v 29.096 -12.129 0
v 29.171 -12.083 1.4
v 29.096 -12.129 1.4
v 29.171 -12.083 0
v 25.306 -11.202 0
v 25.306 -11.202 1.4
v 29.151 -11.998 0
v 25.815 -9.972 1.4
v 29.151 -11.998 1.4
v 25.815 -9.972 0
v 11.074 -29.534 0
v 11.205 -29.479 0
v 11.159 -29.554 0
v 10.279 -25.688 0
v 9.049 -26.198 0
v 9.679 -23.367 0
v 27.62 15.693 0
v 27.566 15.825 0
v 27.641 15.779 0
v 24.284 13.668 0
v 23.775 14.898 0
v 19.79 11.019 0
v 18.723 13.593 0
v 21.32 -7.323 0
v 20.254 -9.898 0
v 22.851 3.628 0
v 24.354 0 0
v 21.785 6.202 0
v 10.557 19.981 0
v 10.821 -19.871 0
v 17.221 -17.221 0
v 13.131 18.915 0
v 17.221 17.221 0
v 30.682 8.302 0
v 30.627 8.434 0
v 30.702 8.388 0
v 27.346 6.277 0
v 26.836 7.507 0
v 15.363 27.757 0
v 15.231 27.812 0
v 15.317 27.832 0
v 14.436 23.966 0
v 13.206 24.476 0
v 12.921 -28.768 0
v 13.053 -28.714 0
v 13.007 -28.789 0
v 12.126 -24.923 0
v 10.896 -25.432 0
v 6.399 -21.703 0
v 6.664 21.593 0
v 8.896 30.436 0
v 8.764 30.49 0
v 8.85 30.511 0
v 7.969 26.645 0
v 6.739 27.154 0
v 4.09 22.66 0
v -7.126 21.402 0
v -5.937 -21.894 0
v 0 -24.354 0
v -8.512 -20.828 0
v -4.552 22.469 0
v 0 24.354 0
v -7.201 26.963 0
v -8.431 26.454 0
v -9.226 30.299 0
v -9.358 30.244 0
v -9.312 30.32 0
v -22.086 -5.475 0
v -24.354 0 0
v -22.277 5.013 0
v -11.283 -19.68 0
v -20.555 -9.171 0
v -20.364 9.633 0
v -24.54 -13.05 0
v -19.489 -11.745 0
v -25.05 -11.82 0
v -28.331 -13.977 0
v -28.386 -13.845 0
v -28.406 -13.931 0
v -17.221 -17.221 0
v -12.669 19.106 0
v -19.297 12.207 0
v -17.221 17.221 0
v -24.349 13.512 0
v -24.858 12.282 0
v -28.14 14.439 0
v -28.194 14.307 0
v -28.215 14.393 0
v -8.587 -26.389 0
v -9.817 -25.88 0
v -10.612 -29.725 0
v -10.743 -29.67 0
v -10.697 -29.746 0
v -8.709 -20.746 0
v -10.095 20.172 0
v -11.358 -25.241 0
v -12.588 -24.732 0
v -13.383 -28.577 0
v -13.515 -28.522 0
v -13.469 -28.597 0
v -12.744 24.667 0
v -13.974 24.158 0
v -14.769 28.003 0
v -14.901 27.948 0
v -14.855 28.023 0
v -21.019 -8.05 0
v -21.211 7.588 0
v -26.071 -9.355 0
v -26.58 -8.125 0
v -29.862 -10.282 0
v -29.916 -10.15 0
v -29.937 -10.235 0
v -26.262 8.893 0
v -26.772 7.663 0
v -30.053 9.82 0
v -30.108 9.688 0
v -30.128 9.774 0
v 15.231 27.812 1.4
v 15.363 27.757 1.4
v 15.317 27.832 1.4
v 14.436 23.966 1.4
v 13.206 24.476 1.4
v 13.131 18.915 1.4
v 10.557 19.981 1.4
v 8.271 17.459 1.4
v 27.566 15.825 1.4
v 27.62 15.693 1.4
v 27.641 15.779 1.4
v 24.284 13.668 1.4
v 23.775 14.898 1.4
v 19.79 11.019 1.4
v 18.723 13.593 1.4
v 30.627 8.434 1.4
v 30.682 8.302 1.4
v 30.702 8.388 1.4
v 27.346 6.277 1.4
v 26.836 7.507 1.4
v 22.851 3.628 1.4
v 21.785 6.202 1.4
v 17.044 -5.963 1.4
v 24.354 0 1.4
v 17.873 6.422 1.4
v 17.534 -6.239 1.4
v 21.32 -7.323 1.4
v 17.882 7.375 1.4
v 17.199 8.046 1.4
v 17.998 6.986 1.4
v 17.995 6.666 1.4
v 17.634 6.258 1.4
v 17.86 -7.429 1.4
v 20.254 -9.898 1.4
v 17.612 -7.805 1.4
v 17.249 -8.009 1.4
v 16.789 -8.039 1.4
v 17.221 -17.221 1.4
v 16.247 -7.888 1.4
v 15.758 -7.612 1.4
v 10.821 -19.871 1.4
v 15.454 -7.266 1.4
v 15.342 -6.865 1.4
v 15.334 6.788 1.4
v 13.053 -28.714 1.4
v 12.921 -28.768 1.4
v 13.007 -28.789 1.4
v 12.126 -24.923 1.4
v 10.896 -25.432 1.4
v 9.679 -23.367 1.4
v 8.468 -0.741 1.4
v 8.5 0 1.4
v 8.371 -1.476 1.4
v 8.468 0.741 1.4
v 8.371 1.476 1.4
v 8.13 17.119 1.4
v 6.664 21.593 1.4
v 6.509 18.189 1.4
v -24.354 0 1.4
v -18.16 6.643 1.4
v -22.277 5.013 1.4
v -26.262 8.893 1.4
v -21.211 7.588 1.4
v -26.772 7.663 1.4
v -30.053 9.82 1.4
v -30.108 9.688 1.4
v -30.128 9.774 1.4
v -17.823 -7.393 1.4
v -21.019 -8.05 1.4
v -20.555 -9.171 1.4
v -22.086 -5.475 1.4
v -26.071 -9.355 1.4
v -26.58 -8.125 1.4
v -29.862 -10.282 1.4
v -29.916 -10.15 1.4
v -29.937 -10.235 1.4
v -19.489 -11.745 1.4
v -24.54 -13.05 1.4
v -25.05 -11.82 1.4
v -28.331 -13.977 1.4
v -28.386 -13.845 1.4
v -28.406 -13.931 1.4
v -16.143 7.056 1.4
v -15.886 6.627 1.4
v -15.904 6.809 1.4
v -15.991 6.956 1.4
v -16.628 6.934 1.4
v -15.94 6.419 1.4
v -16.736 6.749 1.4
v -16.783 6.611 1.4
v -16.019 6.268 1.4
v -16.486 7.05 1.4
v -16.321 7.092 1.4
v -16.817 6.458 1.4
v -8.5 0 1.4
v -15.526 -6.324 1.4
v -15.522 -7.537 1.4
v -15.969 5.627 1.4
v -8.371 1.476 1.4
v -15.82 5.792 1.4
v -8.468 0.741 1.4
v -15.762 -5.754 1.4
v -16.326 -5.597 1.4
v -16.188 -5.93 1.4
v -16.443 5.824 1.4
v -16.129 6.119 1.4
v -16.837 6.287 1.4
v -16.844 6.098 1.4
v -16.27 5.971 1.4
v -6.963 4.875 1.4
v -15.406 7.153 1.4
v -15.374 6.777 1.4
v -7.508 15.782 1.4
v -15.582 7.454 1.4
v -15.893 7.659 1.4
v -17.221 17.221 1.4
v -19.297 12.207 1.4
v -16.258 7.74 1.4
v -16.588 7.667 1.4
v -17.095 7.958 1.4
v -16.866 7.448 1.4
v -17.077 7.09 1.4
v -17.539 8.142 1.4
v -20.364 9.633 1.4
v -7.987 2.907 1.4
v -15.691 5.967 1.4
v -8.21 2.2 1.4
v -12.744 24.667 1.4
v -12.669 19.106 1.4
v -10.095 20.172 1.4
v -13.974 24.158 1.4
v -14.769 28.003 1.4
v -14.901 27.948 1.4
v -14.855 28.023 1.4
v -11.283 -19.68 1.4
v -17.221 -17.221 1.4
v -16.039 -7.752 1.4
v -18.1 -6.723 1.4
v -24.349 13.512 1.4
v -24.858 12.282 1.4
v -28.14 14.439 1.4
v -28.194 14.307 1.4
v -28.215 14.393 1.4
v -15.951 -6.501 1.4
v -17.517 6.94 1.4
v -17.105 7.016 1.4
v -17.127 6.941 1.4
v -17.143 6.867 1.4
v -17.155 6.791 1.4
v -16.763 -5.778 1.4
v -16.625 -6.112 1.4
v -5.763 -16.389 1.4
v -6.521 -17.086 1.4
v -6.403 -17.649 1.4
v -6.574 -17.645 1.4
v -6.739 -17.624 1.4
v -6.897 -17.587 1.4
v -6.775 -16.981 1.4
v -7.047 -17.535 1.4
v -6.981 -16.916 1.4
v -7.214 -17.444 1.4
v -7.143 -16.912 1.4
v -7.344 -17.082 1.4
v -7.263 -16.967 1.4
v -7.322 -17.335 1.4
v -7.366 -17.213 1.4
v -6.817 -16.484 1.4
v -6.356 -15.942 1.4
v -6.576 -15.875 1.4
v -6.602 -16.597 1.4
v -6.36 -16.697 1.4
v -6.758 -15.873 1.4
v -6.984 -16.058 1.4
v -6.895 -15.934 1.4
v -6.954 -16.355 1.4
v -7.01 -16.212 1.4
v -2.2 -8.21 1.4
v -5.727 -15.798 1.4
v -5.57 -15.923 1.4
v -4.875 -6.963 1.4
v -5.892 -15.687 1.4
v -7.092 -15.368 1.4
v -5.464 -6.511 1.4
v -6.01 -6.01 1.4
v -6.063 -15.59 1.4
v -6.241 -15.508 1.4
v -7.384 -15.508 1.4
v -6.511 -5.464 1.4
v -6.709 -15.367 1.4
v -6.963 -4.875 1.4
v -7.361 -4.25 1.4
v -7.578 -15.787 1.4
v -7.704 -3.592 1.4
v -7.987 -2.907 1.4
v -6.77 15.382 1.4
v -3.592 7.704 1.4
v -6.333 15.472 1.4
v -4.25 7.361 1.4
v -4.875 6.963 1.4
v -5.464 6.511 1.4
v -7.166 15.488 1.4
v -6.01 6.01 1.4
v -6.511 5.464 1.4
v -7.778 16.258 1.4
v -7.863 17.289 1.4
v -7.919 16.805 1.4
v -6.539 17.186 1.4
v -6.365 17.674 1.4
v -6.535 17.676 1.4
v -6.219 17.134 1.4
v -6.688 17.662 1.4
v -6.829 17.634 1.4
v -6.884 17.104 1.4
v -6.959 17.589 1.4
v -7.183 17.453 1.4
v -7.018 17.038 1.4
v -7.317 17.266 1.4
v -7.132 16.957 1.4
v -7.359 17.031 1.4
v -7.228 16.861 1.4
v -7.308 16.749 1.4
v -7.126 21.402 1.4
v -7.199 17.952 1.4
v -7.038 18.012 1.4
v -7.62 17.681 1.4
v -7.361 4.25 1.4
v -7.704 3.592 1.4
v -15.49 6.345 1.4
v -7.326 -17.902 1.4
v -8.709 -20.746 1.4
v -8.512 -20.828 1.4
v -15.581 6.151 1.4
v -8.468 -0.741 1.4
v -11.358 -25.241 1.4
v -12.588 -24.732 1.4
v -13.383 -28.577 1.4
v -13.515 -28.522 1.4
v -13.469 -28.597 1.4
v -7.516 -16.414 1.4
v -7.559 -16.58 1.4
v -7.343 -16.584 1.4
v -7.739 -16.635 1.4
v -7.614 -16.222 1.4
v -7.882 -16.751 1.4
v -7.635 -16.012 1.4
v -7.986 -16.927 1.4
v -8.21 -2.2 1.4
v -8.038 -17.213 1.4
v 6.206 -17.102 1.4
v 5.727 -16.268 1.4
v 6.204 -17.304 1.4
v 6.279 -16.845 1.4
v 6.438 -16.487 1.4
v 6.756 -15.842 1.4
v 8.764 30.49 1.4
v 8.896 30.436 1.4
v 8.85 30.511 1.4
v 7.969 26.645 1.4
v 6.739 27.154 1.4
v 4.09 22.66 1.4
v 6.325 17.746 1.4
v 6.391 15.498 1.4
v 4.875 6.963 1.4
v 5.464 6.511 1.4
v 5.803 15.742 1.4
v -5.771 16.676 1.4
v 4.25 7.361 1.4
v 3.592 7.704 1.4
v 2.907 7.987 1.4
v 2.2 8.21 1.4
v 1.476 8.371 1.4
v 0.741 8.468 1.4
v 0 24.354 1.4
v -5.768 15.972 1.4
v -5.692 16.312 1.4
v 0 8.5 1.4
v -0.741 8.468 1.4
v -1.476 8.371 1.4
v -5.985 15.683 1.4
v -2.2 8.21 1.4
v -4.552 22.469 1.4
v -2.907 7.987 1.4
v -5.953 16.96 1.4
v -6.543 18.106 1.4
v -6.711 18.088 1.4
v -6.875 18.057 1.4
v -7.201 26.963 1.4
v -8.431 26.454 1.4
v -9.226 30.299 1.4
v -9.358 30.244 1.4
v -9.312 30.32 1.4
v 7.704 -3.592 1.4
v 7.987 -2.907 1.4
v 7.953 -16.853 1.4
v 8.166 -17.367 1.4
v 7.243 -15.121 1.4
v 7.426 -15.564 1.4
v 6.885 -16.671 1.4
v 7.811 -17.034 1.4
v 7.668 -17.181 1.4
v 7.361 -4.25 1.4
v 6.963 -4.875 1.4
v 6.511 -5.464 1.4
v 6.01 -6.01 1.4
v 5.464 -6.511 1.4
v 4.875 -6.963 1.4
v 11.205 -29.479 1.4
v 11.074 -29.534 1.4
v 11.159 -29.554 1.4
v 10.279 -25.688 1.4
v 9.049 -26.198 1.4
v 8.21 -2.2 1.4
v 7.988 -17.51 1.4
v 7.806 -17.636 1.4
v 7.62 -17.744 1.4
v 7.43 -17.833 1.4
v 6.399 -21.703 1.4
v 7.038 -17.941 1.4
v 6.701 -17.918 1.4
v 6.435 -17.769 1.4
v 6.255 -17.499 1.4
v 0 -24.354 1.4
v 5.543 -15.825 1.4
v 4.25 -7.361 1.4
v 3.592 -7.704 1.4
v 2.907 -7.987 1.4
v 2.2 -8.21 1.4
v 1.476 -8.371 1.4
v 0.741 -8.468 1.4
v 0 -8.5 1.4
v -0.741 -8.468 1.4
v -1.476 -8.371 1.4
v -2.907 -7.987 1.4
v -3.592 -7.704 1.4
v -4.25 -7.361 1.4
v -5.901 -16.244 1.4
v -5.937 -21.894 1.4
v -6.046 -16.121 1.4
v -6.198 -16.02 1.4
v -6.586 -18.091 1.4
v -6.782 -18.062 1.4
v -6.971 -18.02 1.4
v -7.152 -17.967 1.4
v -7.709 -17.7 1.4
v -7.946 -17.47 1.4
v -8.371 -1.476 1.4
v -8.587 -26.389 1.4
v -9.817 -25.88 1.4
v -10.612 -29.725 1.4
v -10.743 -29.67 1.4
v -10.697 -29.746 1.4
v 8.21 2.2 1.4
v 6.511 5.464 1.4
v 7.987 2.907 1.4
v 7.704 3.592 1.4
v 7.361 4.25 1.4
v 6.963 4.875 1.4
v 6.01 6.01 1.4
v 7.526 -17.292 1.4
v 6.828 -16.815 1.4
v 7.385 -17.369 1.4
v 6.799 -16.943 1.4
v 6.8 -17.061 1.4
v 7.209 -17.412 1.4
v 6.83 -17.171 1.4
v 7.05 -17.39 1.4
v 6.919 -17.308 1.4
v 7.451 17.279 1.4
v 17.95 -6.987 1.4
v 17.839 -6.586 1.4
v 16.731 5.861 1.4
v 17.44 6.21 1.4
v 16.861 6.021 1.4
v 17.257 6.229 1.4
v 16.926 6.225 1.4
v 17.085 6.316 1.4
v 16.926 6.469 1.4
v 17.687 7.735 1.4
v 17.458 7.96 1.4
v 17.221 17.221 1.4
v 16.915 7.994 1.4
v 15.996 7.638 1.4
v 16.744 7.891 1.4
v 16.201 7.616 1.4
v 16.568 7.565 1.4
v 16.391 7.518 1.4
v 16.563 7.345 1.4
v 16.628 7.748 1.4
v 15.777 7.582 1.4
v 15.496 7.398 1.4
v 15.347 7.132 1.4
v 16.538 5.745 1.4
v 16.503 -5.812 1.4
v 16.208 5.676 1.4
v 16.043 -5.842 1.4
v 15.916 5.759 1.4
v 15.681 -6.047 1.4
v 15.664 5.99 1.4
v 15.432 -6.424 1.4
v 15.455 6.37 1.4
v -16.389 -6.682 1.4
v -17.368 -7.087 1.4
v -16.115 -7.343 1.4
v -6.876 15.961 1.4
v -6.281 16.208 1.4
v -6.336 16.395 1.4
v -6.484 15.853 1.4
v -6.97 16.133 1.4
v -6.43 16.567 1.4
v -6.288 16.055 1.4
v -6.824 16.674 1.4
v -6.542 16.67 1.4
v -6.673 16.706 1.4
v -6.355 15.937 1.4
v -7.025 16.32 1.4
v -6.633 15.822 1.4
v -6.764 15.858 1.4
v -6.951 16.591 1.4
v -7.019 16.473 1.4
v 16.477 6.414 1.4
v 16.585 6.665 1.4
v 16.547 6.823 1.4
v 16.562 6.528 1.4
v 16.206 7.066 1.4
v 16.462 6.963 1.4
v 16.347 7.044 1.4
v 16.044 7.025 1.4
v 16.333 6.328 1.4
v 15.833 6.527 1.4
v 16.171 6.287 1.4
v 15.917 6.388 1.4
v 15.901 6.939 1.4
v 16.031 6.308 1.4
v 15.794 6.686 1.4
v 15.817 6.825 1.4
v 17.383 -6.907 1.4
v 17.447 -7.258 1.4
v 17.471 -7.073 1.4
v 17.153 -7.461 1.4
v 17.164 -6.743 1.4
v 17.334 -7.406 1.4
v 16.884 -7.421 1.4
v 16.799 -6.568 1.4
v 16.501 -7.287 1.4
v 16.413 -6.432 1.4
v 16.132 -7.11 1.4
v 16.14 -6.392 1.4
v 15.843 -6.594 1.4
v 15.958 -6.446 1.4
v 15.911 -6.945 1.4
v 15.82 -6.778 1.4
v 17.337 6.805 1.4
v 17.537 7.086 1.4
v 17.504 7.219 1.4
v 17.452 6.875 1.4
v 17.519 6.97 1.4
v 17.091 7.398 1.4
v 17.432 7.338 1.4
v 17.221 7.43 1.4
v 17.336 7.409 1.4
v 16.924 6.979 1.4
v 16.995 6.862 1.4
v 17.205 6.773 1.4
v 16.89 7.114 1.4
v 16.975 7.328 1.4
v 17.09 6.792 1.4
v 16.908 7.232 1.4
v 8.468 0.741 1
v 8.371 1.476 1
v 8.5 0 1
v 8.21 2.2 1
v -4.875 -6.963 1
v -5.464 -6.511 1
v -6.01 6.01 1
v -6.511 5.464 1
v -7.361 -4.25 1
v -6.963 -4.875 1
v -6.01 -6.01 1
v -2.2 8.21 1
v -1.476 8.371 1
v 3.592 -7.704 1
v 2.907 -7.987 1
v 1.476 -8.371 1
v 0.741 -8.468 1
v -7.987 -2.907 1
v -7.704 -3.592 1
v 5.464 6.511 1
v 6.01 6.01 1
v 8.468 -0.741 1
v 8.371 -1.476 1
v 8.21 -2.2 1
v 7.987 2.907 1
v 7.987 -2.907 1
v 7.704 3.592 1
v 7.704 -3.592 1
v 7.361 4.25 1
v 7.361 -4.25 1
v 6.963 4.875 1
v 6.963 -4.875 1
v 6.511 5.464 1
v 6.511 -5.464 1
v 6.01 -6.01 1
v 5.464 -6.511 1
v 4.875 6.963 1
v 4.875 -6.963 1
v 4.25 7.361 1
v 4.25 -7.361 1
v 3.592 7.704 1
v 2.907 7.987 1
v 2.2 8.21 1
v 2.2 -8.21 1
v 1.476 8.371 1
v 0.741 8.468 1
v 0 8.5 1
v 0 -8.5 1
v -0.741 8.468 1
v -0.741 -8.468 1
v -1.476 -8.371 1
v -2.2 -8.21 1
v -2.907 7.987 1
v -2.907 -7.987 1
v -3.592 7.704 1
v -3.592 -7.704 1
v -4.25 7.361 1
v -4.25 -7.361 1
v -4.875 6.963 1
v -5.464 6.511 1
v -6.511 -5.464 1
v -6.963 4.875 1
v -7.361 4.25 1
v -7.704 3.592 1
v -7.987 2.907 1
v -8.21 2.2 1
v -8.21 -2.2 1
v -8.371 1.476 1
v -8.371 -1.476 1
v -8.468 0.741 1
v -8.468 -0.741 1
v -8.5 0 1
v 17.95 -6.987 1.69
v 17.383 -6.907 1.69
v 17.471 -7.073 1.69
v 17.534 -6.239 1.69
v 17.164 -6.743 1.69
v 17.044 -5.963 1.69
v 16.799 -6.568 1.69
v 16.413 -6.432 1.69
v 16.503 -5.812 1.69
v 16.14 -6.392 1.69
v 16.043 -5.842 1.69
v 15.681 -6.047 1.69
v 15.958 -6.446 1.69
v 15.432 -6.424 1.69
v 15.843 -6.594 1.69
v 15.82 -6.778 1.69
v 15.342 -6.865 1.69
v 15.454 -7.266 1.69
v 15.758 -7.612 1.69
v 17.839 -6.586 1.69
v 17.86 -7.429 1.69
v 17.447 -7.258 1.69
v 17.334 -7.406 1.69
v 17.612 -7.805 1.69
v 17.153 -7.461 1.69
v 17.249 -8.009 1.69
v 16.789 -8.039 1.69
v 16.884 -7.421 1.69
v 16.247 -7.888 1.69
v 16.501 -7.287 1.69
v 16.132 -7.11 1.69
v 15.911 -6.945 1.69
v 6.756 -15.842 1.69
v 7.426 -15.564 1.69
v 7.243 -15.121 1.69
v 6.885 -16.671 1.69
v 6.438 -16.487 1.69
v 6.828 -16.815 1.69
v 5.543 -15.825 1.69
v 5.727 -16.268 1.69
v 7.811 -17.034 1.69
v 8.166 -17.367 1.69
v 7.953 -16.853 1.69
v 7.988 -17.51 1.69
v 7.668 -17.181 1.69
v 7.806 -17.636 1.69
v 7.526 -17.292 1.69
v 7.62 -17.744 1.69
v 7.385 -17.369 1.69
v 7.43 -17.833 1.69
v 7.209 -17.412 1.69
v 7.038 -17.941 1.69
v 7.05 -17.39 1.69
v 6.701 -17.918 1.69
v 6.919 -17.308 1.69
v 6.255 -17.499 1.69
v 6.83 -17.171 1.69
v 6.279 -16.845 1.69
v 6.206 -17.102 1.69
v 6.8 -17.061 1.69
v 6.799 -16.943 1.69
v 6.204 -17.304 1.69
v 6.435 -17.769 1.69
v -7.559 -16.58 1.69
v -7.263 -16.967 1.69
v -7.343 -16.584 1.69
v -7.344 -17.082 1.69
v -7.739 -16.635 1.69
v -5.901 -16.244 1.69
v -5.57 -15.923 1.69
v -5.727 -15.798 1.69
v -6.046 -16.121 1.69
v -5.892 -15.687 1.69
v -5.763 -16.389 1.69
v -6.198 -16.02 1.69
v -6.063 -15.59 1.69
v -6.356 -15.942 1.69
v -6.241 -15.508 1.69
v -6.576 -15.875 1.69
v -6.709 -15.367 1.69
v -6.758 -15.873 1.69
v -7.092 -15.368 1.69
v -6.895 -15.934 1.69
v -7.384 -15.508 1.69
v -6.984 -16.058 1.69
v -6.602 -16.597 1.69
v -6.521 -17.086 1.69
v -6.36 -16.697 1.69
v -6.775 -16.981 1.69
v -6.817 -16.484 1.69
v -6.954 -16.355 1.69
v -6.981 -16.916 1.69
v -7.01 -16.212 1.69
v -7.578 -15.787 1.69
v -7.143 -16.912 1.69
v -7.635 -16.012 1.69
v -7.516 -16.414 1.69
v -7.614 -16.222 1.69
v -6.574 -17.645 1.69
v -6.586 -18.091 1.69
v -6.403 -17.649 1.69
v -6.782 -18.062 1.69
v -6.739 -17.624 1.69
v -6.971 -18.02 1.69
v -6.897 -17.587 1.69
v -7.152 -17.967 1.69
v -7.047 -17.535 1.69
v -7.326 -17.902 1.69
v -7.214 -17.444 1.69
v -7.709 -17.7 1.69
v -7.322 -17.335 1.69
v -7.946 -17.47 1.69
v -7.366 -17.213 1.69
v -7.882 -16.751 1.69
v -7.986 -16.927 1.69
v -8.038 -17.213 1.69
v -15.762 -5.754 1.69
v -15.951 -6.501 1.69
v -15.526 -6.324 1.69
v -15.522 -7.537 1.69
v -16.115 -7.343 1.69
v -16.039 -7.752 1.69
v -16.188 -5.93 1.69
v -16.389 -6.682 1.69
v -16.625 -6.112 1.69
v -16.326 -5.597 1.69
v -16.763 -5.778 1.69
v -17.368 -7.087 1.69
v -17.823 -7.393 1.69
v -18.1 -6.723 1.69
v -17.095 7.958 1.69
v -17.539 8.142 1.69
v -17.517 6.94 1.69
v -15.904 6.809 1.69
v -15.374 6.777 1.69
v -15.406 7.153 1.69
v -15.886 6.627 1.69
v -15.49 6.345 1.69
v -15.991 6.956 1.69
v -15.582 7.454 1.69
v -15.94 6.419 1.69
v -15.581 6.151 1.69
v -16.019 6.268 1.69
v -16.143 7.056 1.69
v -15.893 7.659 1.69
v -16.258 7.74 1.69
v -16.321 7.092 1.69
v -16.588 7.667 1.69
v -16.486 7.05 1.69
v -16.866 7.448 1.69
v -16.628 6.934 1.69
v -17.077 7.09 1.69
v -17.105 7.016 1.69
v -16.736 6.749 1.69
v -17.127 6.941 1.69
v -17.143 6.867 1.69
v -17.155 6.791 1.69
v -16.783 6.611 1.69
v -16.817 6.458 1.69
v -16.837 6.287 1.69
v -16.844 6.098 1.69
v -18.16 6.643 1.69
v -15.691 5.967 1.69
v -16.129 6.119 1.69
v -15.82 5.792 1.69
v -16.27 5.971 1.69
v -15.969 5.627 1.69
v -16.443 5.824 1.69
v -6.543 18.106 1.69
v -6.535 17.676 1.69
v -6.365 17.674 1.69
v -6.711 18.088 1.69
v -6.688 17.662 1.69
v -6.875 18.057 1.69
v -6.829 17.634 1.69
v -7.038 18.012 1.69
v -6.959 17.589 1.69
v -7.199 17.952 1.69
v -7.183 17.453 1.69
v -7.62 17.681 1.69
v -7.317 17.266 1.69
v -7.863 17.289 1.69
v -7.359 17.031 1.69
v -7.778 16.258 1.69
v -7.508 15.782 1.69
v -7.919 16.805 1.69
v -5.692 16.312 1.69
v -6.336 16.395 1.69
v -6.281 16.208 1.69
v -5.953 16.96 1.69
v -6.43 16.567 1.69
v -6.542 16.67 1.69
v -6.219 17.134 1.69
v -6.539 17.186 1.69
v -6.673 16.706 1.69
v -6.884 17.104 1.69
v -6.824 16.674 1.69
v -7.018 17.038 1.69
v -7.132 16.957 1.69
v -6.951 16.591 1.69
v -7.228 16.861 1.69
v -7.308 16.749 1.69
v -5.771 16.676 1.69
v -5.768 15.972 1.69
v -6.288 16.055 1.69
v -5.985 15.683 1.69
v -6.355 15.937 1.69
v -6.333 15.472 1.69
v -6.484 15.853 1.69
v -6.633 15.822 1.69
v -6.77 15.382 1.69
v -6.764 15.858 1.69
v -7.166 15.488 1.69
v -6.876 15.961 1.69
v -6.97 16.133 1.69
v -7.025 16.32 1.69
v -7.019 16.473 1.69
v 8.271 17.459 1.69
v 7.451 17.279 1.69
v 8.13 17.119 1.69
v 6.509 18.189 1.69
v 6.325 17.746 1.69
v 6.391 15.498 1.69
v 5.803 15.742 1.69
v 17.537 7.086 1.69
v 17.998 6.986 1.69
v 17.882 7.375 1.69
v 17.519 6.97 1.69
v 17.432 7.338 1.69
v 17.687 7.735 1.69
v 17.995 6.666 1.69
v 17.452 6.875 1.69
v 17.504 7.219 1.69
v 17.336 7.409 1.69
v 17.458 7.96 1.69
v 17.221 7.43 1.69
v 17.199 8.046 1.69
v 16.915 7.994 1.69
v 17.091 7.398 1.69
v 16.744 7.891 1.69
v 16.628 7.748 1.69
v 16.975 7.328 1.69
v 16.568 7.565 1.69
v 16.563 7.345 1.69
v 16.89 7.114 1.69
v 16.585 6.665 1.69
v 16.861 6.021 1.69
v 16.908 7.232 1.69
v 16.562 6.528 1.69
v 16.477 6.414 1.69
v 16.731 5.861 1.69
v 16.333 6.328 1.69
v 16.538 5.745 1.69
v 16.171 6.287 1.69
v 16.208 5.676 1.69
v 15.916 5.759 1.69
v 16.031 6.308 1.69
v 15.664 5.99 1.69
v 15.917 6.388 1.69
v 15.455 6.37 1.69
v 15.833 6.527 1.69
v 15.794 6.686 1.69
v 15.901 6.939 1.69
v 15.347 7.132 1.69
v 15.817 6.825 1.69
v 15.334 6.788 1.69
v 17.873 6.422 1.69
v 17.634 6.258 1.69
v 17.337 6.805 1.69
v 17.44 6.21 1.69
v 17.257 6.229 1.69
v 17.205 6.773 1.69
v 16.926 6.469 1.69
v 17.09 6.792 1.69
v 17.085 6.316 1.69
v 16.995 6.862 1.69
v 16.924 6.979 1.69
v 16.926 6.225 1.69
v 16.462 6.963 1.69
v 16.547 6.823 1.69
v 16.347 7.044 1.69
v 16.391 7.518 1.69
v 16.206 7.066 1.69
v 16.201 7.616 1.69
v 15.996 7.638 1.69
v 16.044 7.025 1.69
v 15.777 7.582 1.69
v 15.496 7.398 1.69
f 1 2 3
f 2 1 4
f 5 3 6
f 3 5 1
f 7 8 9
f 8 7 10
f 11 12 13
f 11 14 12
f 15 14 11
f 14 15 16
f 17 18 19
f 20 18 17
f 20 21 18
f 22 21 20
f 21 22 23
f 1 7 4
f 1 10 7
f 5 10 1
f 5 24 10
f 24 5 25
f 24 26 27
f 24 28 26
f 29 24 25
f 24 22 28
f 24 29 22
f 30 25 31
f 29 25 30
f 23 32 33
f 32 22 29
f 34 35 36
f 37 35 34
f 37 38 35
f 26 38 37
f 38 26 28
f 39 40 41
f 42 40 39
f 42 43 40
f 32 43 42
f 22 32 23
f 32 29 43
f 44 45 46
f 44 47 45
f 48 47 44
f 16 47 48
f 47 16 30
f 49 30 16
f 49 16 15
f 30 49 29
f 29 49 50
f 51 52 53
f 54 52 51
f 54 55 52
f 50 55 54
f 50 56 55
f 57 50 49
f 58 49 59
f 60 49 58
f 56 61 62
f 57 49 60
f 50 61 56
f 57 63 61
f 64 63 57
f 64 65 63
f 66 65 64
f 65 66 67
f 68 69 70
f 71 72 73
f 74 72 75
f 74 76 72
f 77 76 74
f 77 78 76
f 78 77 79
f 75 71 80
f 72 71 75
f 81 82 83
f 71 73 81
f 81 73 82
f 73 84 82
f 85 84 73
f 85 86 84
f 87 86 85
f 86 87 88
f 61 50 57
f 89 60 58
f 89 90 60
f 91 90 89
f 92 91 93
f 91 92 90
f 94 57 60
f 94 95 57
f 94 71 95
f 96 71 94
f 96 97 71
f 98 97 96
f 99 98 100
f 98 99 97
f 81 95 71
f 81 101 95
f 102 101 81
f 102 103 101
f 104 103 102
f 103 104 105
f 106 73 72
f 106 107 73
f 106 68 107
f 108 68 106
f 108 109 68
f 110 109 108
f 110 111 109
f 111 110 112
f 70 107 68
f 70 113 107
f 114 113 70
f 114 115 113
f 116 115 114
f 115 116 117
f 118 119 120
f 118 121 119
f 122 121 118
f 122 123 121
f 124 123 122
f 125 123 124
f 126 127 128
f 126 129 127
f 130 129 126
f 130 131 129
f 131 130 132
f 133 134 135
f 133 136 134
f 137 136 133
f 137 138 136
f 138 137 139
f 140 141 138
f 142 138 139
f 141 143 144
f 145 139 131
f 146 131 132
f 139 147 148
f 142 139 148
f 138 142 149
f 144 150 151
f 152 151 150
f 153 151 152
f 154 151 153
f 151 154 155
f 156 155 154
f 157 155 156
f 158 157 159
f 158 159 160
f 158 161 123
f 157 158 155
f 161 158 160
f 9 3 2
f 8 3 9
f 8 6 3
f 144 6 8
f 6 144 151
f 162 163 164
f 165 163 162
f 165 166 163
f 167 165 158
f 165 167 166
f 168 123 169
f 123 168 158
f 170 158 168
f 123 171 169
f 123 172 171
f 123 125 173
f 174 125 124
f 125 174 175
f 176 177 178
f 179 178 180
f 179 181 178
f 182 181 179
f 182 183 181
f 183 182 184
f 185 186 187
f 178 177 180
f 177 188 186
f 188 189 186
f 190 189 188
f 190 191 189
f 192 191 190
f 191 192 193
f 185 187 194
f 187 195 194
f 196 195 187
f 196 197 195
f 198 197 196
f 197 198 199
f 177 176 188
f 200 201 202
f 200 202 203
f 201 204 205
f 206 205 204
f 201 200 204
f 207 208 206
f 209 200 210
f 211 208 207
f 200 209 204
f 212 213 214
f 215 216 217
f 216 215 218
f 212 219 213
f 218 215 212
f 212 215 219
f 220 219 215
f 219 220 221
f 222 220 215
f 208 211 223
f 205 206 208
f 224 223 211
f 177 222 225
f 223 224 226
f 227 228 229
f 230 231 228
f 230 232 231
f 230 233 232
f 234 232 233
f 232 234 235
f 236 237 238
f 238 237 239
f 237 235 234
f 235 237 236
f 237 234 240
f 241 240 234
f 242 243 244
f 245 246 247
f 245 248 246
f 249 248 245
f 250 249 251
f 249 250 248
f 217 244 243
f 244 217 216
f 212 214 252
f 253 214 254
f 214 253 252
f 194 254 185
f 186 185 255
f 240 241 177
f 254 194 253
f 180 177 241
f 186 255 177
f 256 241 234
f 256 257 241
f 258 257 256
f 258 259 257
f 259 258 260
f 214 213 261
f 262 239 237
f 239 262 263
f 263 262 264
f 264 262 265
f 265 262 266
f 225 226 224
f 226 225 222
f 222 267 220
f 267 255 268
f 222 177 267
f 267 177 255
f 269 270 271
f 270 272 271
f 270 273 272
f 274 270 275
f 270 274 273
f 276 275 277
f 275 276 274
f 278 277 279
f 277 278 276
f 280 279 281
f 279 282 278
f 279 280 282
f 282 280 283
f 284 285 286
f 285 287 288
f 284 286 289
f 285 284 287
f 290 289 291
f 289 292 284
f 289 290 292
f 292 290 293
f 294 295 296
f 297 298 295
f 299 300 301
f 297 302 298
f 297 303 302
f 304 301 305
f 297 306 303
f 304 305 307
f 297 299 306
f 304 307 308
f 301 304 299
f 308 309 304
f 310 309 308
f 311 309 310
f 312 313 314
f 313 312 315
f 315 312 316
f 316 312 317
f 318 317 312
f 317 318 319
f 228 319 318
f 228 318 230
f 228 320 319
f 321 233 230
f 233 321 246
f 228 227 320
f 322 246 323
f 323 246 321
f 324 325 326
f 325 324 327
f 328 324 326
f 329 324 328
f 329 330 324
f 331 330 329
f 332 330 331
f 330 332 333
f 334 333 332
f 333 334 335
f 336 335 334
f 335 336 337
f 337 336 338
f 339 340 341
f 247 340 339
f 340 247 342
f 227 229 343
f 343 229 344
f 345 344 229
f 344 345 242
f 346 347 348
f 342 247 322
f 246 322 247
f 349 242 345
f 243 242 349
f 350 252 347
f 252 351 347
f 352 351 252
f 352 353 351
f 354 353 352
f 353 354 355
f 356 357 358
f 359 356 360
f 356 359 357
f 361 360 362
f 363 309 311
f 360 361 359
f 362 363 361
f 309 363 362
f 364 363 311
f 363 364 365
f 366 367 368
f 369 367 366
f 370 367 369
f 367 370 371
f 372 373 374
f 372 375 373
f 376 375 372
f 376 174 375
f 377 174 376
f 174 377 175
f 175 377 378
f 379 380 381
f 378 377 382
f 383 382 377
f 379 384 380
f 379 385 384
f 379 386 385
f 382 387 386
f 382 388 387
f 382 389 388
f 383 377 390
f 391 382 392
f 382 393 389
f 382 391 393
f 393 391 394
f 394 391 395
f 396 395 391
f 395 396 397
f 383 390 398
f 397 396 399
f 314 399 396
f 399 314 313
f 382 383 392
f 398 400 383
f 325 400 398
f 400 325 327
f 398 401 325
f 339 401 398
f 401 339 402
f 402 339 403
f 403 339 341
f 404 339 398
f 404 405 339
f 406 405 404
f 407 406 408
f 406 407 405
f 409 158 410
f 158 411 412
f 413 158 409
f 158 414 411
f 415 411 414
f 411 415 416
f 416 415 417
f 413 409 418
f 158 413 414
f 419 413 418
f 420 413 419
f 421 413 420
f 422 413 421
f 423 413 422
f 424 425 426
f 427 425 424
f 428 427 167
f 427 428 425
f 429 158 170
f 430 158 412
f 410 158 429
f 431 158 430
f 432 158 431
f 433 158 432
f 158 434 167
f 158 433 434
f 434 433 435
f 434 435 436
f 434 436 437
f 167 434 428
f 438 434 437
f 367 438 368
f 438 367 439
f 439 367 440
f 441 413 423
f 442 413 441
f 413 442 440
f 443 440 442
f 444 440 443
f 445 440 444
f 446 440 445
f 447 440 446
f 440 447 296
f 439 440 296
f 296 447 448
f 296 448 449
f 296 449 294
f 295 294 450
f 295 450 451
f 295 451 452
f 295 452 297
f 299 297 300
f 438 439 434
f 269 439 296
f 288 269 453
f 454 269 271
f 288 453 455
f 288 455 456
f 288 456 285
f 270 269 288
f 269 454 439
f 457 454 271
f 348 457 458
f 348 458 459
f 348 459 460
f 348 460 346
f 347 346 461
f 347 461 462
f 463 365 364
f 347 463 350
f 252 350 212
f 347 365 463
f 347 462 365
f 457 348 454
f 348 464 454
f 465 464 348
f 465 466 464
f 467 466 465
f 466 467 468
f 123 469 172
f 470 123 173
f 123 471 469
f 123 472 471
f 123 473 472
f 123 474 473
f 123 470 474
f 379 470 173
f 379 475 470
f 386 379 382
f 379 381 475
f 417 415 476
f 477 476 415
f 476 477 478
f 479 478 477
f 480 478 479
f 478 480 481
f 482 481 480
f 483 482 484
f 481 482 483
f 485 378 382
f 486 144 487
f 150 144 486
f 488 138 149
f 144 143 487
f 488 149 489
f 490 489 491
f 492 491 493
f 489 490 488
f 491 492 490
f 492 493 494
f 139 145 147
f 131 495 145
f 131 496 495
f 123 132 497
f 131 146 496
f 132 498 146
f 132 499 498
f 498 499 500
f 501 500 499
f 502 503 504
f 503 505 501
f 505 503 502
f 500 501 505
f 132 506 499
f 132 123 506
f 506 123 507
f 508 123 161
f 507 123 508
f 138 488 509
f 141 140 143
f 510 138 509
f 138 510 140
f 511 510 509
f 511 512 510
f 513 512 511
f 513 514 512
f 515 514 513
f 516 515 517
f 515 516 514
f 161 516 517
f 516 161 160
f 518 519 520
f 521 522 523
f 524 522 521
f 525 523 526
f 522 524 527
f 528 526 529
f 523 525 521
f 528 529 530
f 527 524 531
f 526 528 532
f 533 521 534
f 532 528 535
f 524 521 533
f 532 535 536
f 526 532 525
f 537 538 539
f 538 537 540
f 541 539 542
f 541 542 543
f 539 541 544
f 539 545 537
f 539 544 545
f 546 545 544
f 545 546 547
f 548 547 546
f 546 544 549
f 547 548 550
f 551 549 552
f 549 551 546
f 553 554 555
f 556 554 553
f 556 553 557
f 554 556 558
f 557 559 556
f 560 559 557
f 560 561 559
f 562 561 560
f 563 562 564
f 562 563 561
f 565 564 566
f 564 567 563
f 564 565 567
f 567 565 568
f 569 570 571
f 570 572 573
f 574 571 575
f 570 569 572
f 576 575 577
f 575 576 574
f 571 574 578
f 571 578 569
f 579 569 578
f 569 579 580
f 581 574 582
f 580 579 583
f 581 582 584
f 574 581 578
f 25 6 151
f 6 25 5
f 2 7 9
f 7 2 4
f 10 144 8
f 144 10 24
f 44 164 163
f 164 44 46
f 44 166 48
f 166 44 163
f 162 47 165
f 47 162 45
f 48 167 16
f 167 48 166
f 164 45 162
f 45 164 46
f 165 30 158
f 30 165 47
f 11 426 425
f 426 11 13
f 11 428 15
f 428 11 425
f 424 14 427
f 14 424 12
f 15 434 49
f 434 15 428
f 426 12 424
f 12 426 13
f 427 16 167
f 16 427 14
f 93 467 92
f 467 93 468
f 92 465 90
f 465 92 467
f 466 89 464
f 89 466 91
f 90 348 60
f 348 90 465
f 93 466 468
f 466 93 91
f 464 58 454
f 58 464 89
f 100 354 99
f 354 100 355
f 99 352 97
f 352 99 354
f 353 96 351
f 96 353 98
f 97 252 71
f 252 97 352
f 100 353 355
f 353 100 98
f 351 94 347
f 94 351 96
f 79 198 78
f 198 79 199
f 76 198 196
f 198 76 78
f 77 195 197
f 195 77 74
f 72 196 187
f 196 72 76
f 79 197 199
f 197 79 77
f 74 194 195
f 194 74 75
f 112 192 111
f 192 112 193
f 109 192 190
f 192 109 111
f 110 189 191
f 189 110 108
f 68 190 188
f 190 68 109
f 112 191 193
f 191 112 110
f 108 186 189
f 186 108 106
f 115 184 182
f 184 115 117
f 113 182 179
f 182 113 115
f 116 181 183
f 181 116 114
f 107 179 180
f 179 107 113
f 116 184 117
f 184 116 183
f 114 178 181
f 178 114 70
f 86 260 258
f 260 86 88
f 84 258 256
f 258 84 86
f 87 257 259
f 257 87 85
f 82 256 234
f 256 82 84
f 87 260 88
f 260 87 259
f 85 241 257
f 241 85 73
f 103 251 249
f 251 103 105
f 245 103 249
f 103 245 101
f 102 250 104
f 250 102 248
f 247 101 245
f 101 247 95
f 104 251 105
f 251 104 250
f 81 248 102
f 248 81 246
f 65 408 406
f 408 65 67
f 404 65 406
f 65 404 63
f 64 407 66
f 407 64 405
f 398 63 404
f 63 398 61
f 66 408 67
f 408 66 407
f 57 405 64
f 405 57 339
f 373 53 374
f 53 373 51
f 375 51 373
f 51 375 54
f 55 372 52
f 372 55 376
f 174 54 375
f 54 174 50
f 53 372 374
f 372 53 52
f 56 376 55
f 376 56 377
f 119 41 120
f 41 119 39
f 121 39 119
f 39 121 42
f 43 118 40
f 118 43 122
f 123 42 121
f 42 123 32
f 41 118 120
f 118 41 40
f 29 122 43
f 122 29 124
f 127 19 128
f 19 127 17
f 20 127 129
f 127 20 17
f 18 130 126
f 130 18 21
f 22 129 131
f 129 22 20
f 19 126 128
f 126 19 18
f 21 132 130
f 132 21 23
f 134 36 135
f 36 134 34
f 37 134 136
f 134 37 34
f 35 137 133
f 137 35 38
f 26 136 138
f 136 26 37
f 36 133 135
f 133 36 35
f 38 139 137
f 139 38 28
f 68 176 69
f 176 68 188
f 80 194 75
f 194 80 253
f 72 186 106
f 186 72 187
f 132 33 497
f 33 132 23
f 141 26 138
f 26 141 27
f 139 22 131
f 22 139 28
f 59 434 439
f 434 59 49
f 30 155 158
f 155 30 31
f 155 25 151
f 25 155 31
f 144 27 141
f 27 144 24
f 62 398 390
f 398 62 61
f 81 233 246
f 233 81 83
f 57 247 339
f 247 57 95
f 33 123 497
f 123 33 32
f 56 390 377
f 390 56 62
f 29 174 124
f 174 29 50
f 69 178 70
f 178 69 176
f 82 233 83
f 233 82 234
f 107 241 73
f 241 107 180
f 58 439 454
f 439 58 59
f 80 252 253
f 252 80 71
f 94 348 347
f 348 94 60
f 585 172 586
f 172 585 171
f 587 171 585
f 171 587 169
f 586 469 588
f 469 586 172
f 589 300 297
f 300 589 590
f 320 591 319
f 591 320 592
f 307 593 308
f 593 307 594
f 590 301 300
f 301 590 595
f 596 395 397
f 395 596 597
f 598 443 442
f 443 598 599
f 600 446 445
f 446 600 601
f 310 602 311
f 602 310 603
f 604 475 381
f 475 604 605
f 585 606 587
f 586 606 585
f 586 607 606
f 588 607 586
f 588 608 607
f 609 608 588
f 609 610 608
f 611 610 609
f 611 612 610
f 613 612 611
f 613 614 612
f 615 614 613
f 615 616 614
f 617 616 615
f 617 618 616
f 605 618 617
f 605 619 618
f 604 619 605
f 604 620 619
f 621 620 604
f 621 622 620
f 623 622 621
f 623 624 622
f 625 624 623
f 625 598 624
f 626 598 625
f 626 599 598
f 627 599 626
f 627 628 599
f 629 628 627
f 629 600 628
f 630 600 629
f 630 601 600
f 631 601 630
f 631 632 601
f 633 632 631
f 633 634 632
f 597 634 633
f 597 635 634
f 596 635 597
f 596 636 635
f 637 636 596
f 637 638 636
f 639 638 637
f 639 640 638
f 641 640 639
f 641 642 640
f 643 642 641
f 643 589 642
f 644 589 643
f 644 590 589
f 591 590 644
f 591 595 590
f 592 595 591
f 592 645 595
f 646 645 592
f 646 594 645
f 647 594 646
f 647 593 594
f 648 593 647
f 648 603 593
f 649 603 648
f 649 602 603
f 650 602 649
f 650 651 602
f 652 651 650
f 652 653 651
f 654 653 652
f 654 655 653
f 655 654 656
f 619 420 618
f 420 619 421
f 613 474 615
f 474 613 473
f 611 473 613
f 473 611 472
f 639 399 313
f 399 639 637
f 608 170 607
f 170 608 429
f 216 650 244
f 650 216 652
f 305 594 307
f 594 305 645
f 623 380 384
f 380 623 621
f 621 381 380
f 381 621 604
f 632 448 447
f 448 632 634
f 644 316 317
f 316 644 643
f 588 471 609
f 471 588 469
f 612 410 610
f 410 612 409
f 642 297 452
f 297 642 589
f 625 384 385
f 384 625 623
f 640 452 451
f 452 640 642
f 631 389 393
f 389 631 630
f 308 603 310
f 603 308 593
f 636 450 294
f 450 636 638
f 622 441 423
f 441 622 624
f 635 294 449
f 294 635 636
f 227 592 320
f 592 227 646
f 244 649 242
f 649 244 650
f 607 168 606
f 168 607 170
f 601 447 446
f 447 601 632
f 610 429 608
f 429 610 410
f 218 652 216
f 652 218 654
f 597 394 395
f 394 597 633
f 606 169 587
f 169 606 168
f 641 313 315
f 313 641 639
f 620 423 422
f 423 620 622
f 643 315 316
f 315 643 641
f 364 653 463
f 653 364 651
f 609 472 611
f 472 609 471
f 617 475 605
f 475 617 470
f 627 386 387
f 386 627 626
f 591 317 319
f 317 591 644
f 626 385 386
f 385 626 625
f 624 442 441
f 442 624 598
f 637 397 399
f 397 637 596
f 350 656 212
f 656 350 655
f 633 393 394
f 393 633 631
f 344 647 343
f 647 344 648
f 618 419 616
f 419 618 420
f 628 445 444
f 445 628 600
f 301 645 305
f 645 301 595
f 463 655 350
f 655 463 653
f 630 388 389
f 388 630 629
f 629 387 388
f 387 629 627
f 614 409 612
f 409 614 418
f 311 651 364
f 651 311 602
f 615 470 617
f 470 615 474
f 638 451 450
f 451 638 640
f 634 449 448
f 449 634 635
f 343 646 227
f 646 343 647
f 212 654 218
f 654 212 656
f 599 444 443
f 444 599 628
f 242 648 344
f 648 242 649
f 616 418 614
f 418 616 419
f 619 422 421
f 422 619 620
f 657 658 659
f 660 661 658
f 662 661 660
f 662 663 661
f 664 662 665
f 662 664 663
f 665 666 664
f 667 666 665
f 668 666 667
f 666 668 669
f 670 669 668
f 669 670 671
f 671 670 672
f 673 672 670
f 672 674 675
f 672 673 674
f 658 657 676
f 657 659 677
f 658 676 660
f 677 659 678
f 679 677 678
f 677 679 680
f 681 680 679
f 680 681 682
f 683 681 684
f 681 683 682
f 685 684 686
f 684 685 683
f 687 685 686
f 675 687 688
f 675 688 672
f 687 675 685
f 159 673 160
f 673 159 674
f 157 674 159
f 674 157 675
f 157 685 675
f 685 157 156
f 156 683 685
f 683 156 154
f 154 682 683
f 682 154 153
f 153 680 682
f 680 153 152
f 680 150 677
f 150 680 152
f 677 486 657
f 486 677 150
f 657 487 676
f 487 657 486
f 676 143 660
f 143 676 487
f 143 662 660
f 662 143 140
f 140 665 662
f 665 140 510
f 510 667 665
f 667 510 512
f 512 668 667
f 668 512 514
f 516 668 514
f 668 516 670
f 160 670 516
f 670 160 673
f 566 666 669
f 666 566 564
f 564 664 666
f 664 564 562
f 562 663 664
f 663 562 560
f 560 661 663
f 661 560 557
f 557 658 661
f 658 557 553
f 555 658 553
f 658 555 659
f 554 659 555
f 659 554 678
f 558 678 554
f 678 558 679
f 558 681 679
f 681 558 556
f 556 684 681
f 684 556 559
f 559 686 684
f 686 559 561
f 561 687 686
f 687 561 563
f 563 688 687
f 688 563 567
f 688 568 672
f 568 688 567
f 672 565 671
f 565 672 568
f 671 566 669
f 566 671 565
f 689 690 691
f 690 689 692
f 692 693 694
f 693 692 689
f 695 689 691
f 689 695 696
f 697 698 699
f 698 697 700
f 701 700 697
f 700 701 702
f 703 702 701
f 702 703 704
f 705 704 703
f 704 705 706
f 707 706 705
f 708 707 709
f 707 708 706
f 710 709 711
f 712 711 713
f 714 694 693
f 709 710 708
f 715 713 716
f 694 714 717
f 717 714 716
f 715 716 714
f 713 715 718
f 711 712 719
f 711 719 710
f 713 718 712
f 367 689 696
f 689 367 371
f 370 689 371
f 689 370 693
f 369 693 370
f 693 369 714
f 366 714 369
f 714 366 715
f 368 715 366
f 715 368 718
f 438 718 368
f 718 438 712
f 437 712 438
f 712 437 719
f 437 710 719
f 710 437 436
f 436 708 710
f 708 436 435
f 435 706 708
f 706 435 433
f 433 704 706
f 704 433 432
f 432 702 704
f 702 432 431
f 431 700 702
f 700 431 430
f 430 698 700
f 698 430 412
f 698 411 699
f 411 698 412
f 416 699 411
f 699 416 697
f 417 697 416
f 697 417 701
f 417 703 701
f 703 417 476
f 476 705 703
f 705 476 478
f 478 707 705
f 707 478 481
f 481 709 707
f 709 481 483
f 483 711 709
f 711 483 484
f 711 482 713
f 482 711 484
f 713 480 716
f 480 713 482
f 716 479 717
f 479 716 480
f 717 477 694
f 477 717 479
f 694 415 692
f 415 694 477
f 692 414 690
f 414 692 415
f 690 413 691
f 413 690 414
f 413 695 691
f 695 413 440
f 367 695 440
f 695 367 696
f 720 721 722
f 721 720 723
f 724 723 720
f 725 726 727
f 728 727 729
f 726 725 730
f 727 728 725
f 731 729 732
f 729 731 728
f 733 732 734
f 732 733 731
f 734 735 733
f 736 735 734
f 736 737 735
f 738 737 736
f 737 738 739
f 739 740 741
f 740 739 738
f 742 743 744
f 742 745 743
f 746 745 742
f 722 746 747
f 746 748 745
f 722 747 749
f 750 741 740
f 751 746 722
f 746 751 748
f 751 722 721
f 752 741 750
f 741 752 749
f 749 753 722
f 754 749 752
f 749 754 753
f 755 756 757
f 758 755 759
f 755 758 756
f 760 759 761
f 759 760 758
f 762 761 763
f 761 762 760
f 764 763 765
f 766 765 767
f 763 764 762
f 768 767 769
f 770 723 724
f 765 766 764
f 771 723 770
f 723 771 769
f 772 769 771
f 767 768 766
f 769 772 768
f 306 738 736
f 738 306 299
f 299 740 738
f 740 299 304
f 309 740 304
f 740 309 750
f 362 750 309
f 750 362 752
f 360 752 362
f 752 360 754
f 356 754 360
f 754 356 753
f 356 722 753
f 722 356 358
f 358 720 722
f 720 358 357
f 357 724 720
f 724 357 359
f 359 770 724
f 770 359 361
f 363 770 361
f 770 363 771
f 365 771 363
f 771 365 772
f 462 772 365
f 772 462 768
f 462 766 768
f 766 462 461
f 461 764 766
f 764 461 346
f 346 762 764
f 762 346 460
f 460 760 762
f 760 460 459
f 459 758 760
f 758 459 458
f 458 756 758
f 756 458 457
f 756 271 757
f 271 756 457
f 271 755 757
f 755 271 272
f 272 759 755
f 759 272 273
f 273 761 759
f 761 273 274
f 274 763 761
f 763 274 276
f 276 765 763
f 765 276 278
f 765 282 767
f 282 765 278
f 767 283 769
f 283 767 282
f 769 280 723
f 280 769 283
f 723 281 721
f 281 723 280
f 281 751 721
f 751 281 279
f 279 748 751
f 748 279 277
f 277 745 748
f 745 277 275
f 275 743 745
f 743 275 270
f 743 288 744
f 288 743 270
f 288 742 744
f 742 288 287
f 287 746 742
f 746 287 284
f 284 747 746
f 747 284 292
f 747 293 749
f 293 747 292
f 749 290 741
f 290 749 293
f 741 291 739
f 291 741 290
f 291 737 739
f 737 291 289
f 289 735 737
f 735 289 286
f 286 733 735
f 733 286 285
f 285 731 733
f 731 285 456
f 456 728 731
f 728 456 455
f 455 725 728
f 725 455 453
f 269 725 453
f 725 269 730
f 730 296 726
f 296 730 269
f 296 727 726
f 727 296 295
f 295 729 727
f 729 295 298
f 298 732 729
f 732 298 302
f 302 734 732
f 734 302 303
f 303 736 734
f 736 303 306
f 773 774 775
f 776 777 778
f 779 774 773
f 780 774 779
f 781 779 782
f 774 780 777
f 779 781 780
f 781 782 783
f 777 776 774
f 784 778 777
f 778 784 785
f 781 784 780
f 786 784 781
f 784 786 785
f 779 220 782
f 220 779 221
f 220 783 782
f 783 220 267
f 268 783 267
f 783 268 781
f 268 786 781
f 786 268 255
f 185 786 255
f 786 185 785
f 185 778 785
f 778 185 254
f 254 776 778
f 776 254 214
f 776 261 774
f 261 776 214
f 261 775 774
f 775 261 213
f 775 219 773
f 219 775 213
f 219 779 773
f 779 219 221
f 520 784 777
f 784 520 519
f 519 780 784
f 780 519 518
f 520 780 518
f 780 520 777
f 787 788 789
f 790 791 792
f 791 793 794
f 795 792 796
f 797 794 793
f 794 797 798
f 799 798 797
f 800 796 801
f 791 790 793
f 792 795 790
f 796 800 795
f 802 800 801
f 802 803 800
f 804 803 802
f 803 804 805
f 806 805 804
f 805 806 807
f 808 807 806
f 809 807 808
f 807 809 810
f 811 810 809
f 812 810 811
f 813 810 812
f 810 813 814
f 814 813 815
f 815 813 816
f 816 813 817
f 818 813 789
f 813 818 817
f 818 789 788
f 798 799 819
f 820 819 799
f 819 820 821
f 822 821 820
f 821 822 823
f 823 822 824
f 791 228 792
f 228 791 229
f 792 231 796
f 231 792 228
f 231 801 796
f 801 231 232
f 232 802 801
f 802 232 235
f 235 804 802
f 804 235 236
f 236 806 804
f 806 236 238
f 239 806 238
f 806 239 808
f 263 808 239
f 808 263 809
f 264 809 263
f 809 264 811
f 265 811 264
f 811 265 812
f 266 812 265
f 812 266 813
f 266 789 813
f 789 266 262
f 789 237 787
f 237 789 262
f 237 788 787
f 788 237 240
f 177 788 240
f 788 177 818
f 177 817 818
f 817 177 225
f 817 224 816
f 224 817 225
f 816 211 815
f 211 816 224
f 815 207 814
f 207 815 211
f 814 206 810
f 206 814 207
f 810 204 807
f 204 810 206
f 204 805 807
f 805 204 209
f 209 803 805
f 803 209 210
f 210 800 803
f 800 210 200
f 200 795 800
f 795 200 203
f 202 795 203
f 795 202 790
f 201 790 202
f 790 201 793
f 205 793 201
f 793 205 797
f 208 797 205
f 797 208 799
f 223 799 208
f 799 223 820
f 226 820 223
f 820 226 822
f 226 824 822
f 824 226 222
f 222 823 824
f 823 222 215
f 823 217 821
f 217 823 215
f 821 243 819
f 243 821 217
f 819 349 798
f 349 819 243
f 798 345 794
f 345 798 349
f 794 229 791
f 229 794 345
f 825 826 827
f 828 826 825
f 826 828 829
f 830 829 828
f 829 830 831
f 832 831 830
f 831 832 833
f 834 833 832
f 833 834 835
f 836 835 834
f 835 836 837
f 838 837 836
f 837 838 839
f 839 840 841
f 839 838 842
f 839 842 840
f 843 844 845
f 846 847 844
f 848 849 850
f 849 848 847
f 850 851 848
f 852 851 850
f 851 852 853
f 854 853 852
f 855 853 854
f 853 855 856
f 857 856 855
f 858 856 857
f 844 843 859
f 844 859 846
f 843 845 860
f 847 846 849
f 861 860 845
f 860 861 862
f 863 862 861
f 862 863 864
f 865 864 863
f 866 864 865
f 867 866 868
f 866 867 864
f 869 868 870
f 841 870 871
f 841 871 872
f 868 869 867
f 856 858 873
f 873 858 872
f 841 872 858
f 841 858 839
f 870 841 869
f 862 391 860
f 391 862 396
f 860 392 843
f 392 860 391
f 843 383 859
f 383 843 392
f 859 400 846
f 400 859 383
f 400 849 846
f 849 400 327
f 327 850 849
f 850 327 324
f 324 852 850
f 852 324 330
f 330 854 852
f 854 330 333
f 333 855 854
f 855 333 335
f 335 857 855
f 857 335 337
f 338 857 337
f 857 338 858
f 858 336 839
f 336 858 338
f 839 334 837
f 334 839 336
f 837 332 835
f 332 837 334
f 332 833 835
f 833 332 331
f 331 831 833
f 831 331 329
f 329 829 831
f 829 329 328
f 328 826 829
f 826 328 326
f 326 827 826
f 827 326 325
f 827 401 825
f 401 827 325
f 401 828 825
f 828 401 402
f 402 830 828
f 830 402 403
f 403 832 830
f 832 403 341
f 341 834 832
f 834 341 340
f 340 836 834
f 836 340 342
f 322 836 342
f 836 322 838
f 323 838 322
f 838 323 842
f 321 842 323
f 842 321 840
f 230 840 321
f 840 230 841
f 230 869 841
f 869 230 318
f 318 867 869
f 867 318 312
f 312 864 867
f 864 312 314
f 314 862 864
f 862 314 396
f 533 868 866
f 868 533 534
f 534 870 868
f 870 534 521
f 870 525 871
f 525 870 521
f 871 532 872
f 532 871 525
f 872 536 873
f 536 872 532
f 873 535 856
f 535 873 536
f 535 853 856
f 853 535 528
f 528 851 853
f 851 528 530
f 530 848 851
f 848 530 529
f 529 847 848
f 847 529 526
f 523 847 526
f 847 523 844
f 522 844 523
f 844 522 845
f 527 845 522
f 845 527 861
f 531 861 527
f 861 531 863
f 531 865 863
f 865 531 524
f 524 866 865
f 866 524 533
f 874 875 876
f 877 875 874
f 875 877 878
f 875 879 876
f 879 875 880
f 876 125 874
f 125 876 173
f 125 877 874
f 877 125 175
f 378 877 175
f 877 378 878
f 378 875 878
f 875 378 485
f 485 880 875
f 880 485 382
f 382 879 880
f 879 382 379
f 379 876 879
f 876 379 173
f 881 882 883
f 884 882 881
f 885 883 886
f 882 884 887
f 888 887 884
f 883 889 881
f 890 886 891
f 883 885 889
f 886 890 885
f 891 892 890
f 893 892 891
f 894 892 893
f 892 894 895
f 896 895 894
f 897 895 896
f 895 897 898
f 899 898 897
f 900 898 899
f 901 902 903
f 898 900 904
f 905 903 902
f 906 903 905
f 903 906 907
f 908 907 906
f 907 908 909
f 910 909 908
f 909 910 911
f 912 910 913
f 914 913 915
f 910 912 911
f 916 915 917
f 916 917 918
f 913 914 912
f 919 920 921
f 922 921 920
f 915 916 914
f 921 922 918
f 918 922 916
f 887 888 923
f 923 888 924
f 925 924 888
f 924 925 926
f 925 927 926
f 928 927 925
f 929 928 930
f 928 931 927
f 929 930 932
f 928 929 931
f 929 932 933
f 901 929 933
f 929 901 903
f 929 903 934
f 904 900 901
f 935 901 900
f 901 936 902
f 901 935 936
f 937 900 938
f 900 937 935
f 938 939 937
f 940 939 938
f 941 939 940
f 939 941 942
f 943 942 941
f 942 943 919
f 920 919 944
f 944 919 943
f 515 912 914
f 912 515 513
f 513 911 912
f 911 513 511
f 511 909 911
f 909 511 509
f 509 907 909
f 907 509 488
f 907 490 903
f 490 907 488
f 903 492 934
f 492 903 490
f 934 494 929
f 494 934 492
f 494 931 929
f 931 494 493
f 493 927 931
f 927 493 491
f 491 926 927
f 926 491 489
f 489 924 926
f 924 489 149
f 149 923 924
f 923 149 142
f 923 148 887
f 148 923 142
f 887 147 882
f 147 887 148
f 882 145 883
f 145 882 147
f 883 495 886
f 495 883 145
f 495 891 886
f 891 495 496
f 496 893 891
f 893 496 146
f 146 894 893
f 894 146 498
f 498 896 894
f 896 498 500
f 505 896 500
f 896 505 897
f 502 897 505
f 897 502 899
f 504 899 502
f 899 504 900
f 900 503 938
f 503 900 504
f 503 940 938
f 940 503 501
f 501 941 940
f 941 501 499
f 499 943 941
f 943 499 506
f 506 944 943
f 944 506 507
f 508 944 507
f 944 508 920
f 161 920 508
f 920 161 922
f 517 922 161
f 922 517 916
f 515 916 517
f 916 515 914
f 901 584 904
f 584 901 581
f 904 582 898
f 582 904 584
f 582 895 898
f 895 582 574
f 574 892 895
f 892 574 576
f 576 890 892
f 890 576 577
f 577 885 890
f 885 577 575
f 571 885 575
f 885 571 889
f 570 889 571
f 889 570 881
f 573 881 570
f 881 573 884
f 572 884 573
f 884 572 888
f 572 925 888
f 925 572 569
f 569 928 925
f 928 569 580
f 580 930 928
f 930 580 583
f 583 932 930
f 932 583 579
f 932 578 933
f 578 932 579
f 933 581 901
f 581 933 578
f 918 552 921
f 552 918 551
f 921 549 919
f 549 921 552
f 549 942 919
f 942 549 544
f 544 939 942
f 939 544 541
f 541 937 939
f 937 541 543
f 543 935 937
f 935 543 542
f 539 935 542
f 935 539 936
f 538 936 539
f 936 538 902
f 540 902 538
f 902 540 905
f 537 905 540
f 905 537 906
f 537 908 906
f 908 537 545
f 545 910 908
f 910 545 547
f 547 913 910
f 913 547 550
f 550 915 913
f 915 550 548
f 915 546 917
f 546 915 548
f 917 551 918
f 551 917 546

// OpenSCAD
// 2-Point Discrimination Wheel — parametric n-gon, clockwise order
distances_mm       = is_undef(distances_mm) ? [0,2,3,4,5,6,7,8] : distances_mm;
outer_flat_to_flat = is_undef(outer_flat_to_flat) ? 45 : outer_flat_to_flat;
base_thickness     = is_undef(base_thickness) ? 1.4 : base_thickness;
spike_length  = is_undef(spike_length) ? 9 : spike_length;
base_d        = is_undef(base_d) ? 3 : base_d;
shank_d       = is_undef(shank_d) ? 1.4 : shank_d;
tip_d         = is_undef(tip_d) ? 0.15 : tip_d;
root_overlap  = is_undef(root_overlap) ? .7 : root_overlap;
label_size    = is_undef(label_size) ? 2.5 : label_size;
label_depth   = is_undef(label_depth) ? .3 : label_depth;
font_name     = is_undef(font_name) ? "DejaVu Sans:style=Bold" : font_name;
label_radial  = is_undef(label_radial) ? 0.80 : label_radial;
hub_diameter  = is_undef(hub_diameter) ? 17 : hub_diameter;
thumb_depth   = is_undef(thumb_depth) ? 1.2 : thumb_depth;
chamfer = is_undef(chamfer) ? 0.8 : chamfer;
$fn = is_undef($fn) ? 72 : $fn;

module soft_chamfer(h=chamfer){
  if (h>0) minkowski(){ children(); cylinder(h=h,r1=h,r2=0,$fn=24); }
  else children();
}
function apothem(across_flats,n)=across_flats/2;
function circ_radius(across_flats,n)=across_flats/(2*cos(180/n));
function total_thickness()=base_thickness+max(chamfer,0);

module polygon_plate(n, across_flats, thk){
  r = circ_radius(across_flats,n);
  linear_extrude(thk)
    polygon(points=[for(i=[0:n-1]) let(a=360*i/n)[r*cos(a), r*sin(a)]]);
}


module spike_single_flat(len=spike_length,bd=base_d,sd=shank_d,td=tip_d){
  base_r=bd/2; shank_r=sd/2; tip_r=td/2;
  bx=-root_overlap; sx=len*0.55; tx=len;
  linear_extrude(height=base_thickness)
  union(){
    translate([bx,0]) circle(r=base_r);
    hull(){translate([bx,0])circle(r=base_r);translate([sx,0])circle(r=shank_r);}
    hull(){translate([sx,0])circle(r=shank_r);translate([tx,0])circle(r=tip_r);}
  }
}

module thumb_well_top(){
  translate([0,0,total_thickness()-thumb_depth])
    cylinder(h=thumb_depth,d=hub_diameter,$fn=72);
}

module edge_numbers_top(distances,a){
  n=len(distances);
  for(i=[0:n-1]){
    angN=-360*(i+0.5)/n;
    translate([(label_radial*a)*cos(angN),
               (label_radial*a)*sin(angN),
               base_thickness - 0.01])
      rotate([0,0,angN-90])
        linear_extrude(height=label_depth)
          text(str(distances[i]),
               size=label_size,font=font_name,
               halign="center",valign="center");
  }
}


module wheel_solid(distances){
  n=len(distances);
  a=apothem(outer_flat_to_flat,n);
  union(){
    polygon_plate(n,outer_flat_to_flat,base_thickness);
    for(i=[0:n-1]){
      angN=-360*(i+0.5)/n;
      translate([a*cos(angN),a*sin(angN),0])
        rotate([0,0,angN]){
          sep=distances[i];
          translate([0,+sep/2,0])spike_single_flat();
          translate([0,-sep/2,0])spike_single_flat();
        }
    }
  }
}

module discriminator(distances){
  n=len(distances);
  assert(n>=3,"distances_mm must have at least 3 entries.");

  union(){
    difference(){
      wheel_solid(distances);
      thumb_well_top();
    }
    edge_numbers_top(distances, apothem(outer_flat_to_flat,n));
  }
}
discriminator(distances_mm);
